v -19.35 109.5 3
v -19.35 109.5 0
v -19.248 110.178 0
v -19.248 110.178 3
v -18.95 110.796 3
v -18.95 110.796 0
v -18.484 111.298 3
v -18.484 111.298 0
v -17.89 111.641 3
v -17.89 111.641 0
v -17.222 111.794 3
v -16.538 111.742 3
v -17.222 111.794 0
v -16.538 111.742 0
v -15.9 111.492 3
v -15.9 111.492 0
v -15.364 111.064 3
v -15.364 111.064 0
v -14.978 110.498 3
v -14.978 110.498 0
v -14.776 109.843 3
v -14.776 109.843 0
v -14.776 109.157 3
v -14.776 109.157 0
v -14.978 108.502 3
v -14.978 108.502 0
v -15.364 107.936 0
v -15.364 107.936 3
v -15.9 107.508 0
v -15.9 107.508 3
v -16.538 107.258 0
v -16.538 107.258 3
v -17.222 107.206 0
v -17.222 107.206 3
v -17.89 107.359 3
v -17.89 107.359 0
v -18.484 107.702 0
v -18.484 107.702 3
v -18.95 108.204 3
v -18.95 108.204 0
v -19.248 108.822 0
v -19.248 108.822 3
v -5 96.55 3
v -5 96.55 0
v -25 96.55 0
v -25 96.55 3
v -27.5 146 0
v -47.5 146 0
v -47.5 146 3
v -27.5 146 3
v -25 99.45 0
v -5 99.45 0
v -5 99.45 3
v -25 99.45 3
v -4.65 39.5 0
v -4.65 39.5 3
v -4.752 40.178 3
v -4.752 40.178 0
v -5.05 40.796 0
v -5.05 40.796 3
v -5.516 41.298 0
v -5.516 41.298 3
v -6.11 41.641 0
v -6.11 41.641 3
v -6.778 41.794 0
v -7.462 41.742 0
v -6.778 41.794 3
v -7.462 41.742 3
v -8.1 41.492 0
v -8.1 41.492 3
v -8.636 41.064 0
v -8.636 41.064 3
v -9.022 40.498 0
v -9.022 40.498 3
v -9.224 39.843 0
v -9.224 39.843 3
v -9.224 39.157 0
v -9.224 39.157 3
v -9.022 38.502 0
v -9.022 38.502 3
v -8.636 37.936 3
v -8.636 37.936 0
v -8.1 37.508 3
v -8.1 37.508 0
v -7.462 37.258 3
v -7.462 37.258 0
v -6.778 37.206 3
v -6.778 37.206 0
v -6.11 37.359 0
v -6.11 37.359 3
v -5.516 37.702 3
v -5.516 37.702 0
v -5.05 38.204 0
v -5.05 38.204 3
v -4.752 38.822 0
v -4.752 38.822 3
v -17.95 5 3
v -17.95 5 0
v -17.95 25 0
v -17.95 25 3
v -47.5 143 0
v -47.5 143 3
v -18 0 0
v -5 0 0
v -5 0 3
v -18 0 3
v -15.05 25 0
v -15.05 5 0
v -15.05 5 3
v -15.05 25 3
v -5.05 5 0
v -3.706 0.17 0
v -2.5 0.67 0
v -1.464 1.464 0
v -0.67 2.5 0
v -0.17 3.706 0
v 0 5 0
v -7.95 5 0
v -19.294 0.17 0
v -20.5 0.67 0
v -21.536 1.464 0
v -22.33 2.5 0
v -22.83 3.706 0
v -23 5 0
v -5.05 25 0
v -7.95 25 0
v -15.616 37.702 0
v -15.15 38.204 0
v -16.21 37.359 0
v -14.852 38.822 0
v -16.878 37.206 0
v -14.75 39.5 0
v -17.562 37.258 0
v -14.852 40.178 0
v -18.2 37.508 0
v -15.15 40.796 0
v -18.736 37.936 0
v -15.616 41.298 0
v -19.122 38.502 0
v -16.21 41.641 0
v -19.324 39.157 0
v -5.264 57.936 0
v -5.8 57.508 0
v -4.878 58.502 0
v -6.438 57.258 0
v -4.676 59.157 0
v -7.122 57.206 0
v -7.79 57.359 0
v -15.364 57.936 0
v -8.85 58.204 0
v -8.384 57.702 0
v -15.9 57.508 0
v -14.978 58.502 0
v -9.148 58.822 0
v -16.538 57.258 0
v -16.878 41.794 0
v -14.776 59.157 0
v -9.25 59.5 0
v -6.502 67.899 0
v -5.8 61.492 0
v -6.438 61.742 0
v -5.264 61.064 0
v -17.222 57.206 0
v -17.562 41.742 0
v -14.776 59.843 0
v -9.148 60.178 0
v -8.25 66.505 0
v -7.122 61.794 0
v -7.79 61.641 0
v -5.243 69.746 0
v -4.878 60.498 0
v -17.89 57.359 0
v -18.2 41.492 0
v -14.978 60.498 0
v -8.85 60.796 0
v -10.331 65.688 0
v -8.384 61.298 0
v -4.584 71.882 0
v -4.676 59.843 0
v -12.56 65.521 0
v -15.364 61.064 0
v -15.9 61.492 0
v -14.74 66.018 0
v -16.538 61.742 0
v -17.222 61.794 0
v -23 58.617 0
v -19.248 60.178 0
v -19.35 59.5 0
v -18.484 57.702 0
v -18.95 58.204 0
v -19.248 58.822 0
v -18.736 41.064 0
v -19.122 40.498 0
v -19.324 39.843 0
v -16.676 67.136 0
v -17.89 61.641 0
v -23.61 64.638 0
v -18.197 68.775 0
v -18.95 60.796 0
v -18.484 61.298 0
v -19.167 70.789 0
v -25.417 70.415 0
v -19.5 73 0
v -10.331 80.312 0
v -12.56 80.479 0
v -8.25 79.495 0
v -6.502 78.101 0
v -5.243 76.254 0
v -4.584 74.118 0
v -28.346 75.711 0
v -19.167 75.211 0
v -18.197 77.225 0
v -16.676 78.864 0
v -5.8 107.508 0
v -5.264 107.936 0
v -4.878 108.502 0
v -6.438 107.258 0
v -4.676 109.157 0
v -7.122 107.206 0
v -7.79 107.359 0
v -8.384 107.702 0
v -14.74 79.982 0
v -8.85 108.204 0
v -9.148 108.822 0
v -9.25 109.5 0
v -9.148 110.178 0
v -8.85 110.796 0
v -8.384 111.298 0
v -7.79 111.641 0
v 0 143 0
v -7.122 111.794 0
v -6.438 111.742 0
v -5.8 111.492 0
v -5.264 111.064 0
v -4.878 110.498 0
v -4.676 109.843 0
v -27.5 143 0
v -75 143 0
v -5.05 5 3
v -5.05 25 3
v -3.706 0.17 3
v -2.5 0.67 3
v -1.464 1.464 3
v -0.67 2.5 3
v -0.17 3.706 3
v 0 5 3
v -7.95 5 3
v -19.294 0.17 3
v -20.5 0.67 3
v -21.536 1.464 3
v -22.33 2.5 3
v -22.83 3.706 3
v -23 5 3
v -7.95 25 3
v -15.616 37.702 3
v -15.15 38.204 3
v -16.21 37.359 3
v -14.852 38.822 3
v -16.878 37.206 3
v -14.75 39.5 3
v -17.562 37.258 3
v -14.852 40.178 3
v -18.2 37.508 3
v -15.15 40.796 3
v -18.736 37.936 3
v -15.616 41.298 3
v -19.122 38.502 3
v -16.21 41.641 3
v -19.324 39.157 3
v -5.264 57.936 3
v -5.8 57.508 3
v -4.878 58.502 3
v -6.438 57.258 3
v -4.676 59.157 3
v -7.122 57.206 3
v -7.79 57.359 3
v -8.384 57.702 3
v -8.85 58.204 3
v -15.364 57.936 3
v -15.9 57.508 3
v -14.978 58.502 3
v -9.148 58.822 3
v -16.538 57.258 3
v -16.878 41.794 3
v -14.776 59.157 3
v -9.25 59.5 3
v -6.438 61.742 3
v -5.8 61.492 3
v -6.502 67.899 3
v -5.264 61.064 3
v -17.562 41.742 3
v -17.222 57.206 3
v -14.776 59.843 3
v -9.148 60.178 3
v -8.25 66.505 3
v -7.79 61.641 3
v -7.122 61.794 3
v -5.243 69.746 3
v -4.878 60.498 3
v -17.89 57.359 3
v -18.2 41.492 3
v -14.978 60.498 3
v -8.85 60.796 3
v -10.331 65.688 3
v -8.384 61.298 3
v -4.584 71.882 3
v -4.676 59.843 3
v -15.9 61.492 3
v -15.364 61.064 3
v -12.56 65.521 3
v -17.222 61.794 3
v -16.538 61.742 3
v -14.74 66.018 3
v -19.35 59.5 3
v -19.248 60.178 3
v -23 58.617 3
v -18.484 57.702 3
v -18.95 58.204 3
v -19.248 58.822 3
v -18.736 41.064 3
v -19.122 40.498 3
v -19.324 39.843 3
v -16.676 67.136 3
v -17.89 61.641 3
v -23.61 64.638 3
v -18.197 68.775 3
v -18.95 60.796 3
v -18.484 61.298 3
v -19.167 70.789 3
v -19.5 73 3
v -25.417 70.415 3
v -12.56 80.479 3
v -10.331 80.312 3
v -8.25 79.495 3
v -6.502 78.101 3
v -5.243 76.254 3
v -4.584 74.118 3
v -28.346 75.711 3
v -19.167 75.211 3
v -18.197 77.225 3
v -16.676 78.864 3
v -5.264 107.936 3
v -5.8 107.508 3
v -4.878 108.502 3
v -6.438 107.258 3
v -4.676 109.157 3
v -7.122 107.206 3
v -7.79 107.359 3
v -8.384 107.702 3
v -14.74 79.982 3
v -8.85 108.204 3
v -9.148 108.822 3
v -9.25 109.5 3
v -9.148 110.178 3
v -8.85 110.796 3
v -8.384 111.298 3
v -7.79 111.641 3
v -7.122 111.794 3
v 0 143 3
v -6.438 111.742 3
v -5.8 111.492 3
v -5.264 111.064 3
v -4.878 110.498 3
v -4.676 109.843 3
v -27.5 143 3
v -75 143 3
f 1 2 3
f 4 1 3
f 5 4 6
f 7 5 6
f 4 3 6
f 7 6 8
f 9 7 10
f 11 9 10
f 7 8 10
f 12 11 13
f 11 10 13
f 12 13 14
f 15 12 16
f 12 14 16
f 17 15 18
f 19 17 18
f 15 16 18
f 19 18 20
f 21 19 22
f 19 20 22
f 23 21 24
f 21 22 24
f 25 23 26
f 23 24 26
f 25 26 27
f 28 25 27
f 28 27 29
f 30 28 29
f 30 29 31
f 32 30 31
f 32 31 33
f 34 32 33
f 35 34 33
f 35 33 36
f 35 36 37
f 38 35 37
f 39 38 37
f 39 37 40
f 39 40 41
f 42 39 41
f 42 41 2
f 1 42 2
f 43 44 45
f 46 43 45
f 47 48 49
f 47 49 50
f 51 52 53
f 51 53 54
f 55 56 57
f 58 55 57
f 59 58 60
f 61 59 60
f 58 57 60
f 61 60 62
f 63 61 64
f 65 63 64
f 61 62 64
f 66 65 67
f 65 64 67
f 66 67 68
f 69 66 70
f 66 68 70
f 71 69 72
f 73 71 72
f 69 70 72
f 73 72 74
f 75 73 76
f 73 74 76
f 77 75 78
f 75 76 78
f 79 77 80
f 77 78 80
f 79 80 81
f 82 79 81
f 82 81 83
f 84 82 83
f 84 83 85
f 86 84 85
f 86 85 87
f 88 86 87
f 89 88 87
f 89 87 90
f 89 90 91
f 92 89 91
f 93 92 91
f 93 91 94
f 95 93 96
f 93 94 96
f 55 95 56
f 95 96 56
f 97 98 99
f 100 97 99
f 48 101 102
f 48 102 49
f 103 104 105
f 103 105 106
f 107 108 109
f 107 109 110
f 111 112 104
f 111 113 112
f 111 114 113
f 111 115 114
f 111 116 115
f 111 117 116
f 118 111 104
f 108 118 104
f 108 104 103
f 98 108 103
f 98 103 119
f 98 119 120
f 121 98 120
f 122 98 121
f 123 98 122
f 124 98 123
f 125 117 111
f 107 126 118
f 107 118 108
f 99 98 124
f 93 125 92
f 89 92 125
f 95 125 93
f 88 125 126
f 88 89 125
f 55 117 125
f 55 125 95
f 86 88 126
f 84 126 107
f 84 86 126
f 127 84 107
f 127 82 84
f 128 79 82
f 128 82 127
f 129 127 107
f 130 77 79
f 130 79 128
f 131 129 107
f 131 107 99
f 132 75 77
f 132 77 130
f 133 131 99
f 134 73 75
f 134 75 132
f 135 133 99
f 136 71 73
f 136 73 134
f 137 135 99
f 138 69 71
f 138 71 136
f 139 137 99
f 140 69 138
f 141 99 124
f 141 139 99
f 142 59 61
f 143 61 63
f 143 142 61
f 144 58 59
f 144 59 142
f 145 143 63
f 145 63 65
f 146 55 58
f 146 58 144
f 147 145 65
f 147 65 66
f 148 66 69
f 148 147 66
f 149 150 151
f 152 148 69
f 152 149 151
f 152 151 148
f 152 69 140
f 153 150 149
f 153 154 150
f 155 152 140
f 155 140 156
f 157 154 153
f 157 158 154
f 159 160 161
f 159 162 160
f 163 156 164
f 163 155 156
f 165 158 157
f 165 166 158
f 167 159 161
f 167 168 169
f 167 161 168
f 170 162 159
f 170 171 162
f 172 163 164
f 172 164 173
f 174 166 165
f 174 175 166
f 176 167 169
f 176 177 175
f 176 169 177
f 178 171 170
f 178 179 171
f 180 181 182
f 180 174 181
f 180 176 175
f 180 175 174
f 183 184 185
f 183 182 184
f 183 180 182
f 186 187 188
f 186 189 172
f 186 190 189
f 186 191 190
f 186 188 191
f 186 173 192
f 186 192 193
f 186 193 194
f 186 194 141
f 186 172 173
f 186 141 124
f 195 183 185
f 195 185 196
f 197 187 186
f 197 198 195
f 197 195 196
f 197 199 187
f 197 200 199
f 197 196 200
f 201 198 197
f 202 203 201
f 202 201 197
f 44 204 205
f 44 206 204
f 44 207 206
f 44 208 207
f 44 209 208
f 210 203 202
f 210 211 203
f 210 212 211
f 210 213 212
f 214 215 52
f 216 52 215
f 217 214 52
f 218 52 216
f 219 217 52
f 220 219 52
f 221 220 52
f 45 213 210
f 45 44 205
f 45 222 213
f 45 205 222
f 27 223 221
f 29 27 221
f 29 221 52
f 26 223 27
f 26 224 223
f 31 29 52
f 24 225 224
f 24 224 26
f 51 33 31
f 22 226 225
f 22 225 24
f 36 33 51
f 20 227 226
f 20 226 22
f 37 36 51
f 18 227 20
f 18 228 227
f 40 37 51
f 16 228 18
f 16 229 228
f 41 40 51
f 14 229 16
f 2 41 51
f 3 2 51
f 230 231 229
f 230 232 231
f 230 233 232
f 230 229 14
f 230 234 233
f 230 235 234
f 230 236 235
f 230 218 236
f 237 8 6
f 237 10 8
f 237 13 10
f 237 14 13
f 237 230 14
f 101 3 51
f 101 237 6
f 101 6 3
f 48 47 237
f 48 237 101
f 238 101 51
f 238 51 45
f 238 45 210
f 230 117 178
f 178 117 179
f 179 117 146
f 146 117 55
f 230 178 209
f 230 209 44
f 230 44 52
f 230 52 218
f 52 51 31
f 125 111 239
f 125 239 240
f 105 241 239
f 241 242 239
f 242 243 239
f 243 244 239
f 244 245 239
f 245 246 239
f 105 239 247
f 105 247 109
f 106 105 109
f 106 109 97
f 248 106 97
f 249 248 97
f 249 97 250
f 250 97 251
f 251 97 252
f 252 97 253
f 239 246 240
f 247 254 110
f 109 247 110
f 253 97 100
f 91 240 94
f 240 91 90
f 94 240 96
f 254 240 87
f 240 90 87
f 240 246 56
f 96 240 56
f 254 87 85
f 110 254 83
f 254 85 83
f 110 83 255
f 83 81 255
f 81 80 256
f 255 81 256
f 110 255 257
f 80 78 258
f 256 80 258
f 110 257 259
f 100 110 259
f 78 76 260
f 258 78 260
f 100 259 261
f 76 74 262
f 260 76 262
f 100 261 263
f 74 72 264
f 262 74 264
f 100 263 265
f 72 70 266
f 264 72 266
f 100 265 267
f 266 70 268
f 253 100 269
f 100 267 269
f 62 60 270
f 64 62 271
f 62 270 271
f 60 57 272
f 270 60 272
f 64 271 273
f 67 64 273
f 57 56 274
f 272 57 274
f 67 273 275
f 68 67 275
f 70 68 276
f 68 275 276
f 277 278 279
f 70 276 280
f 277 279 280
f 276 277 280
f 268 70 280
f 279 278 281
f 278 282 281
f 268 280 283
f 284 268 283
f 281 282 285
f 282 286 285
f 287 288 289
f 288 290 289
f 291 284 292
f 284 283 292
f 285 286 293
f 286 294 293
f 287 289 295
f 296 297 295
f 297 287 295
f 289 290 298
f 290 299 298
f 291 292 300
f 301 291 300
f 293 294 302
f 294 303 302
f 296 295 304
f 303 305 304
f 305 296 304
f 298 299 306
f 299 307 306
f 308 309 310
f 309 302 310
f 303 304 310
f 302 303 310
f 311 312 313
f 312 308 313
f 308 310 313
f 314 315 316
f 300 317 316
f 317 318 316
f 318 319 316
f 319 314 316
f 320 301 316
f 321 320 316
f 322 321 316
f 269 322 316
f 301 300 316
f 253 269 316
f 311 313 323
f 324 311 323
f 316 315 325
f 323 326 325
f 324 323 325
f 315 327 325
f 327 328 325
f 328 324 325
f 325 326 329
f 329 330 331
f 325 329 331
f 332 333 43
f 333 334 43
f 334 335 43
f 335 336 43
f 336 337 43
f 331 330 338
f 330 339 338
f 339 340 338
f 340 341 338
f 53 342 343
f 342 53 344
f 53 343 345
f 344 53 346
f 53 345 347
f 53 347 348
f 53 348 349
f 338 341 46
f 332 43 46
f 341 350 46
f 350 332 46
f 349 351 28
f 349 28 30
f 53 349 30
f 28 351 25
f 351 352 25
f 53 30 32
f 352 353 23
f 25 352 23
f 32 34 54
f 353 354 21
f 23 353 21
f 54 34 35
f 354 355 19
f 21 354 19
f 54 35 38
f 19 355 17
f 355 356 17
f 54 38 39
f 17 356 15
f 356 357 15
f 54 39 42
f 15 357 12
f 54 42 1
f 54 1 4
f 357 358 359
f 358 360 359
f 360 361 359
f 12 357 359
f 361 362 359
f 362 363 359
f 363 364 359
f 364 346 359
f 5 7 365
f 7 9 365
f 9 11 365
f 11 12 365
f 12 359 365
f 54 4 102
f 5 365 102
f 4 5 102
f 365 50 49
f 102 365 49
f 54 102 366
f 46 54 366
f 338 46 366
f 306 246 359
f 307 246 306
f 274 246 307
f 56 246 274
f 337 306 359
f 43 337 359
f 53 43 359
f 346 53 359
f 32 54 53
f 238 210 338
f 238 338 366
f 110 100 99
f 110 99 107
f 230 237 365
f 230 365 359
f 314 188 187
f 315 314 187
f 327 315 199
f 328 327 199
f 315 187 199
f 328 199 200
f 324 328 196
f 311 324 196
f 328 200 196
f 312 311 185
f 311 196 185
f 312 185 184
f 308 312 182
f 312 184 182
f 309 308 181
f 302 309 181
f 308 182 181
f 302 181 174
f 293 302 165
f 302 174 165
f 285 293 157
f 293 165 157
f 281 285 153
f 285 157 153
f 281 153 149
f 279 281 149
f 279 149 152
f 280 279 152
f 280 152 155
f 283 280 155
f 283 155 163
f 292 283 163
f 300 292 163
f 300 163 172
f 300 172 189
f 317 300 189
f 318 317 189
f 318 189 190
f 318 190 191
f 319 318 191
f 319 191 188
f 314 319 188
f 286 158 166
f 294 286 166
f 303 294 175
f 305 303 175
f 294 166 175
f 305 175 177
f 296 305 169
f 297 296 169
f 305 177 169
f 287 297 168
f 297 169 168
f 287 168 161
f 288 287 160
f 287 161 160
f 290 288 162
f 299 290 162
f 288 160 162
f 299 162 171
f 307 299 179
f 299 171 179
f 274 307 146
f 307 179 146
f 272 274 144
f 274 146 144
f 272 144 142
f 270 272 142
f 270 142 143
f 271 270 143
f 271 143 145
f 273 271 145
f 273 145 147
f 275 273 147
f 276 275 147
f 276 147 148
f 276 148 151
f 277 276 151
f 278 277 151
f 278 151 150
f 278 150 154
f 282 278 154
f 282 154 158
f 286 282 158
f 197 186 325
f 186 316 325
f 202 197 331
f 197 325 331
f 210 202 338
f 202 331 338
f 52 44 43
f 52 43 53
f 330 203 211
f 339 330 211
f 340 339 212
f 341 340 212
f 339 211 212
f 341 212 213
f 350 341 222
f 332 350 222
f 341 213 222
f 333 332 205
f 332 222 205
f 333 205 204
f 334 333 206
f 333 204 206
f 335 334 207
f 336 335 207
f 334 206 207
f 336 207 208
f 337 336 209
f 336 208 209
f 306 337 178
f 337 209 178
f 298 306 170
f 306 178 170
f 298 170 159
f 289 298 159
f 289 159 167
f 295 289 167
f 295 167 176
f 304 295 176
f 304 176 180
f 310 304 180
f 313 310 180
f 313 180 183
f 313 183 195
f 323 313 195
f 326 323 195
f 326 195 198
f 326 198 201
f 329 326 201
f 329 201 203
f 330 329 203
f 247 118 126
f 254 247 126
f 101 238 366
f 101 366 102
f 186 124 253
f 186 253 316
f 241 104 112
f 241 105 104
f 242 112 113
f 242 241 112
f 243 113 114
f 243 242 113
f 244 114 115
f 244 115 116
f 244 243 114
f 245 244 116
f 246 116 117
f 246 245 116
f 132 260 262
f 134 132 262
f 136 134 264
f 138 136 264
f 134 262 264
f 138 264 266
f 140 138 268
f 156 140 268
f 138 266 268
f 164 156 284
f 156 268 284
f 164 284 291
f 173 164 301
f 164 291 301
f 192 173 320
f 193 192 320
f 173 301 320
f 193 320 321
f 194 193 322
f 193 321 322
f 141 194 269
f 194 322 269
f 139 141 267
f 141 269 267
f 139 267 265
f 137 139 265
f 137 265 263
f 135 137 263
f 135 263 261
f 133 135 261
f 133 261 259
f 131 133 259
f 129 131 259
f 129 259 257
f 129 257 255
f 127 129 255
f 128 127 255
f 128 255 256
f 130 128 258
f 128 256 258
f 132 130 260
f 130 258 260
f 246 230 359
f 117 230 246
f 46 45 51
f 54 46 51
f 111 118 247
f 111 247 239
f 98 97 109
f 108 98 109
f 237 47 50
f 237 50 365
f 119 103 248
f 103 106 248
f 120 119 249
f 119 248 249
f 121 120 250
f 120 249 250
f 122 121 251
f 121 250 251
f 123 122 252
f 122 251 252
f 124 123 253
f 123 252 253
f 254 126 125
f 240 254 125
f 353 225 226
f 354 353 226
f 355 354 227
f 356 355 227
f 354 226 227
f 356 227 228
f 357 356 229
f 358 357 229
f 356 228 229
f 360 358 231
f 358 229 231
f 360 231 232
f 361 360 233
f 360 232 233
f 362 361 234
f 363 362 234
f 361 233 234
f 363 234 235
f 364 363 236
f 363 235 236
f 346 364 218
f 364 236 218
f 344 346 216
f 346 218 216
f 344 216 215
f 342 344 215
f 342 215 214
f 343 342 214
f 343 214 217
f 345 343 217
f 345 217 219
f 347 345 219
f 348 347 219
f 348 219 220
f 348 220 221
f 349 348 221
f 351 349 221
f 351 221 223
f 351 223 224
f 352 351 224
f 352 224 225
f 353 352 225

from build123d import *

# Parameters (mm, degrees)
SKETCH1_W           = 2.9
SKETCH1_H           = 20
BOSS_EXTRUDE1_DEPTH = 3
FILLET1_R           = 5
FILLET2_R           = 30
CUT_EXTRUDE1_REACH  = 5
SKETCH3_R           = 7.5
SKETCH3_R_2         = 2.3
SKETCH5_W           = 20
SKETCH5_H           = 2.9
CUT_EXTRUDE2_DEPTH  = 3
SKETCH6_R           = 2.3
CUT_EXTRUDE3_DEPTH  = 3


with BuildPart() as part:
    # Sketch1 → Boss-Extrude1 (new body)
    with BuildSketch(Plane.XY):
        Polygon((0, 0), (-23, 0), (-23, 68), (-75, 143), (-47.5, 143), (-47.5, 146), (-27.5, 146), (-27.5, 143), (0, 143), align=None)
        with Locations((-16.5, 15)):
            Rectangle(SKETCH1_W, SKETCH1_H, mode=Mode.SUBTRACT)
        with Locations((-6.5, 15)):
            Rectangle(SKETCH1_W, SKETCH1_H, mode=Mode.SUBTRACT)
    extrude(amount=BOSS_EXTRUDE1_DEPTH)

    # Fillet1
    fillet1_edges = [part.edges().sort_by_distance(p)[0] for p in [
        (0, 0, 1.5),
        (-23, 0, 1.5),
    ]]
    fillet(fillet1_edges, radius=FILLET1_R)

    # Fillet2
    fillet2_edges = [part.edges().sort_by_distance(p)[0] for p in [
        (-23, 68, 1.5),
    ]]
    fillet(fillet2_edges, radius=FILLET2_R)

    # Sketch3 → Cut-Extrude1 (cut, up to next)
    with BuildSketch(Plane(origin=(0, 0, 0), x_dir=(-1, 0, 0), z_dir=(0, 0, -1)), mode=Mode.PRIVATE) as cut_extrude1_sk1:
        with Locations((12, 73)):
            Circle(SKETCH3_R)
    cut_extrude1_tool1 = extrude(cut_extrude1_sk1.sketch, amount=-CUT_EXTRUDE1_REACH, mode=Mode.PRIVATE) & part.part
    add(cut_extrude1_tool1.solids().sort_by_distance((-12, 73, 0))[0], mode=Mode.SUBTRACT)
    # Sketch3 → Cut-Extrude1 (cut, up to next)
    with BuildSketch(Plane(origin=(0, 0, 0), x_dir=(-1, 0, 0), z_dir=(0, 0, -1)), mode=Mode.PRIVATE) as cut_extrude1_sk2:
        with Locations((17.05, 59.5)):
            Circle(SKETCH3_R_2)
    cut_extrude1_tool2 = extrude(cut_extrude1_sk2.sketch, amount=-CUT_EXTRUDE1_REACH, mode=Mode.PRIVATE) & part.part
    add(cut_extrude1_tool2.solids().sort_by_distance((-17.05, 59.5, 0))[0], mode=Mode.SUBTRACT)
    # Sketch3 → Cut-Extrude1 (cut, up to next)
    with BuildSketch(Plane(origin=(0, 0, 0), x_dir=(-1, 0, 0), z_dir=(0, 0, -1)), mode=Mode.PRIVATE) as cut_extrude1_sk3:
        with Locations((6.95, 59.5)):
            Circle(SKETCH3_R_2)
    cut_extrude1_tool3 = extrude(cut_extrude1_sk3.sketch, amount=-CUT_EXTRUDE1_REACH, mode=Mode.PRIVATE) & part.part
    add(cut_extrude1_tool3.solids().sort_by_distance((-6.95, 59.5, 0))[0], mode=Mode.SUBTRACT)
    # Sketch3 → Cut-Extrude1 (cut, up to next)
    with BuildSketch(Plane(origin=(0, 0, 0), x_dir=(-1, 0, 0), z_dir=(0, 0, -1)), mode=Mode.PRIVATE) as cut_extrude1_sk4:
        with Locations((17.05, 109.5)):
            Circle(SKETCH3_R_2)
    cut_extrude1_tool4 = extrude(cut_extrude1_sk4.sketch, amount=-CUT_EXTRUDE1_REACH, mode=Mode.PRIVATE) & part.part
    add(cut_extrude1_tool4.solids().sort_by_distance((-17.05, 109.5, 0))[0], mode=Mode.SUBTRACT)
    # Sketch3 → Cut-Extrude1 (cut, up to next)
    with BuildSketch(Plane(origin=(0, 0, 0), x_dir=(-1, 0, 0), z_dir=(0, 0, -1)), mode=Mode.PRIVATE) as cut_extrude1_sk5:
        with Locations((6.95, 109.5)):
            Circle(SKETCH3_R_2)
    cut_extrude1_tool5 = extrude(cut_extrude1_sk5.sketch, amount=-CUT_EXTRUDE1_REACH, mode=Mode.PRIVATE) & part.part
    add(cut_extrude1_tool5.solids().sort_by_distance((-6.95, 109.5, 0))[0], mode=Mode.SUBTRACT)

    # Sketch5 → Cut-Extrude2 (cut)
    with BuildSketch(Plane(origin=(0, 0, 0), x_dir=(-1, 0, 0), z_dir=(0, 0, -1))):
        with Locations((15, 98)):
            Rectangle(SKETCH5_W, SKETCH5_H)
    extrude(amount=-CUT_EXTRUDE2_DEPTH, mode=Mode.SUBTRACT)

    # Sketch6 → Cut-Extrude3 (cut)
    with BuildSketch(Plane.XY.offset(3)):
        with Locations((-17.05, 39.5)):
            Circle(SKETCH6_R)
        with Locations((-6.95, 39.5)):
            Circle(SKETCH6_R)
    extrude(amount=-CUT_EXTRUDE3_DEPTH, mode=Mode.SUBTRACT)


solid = part.part
